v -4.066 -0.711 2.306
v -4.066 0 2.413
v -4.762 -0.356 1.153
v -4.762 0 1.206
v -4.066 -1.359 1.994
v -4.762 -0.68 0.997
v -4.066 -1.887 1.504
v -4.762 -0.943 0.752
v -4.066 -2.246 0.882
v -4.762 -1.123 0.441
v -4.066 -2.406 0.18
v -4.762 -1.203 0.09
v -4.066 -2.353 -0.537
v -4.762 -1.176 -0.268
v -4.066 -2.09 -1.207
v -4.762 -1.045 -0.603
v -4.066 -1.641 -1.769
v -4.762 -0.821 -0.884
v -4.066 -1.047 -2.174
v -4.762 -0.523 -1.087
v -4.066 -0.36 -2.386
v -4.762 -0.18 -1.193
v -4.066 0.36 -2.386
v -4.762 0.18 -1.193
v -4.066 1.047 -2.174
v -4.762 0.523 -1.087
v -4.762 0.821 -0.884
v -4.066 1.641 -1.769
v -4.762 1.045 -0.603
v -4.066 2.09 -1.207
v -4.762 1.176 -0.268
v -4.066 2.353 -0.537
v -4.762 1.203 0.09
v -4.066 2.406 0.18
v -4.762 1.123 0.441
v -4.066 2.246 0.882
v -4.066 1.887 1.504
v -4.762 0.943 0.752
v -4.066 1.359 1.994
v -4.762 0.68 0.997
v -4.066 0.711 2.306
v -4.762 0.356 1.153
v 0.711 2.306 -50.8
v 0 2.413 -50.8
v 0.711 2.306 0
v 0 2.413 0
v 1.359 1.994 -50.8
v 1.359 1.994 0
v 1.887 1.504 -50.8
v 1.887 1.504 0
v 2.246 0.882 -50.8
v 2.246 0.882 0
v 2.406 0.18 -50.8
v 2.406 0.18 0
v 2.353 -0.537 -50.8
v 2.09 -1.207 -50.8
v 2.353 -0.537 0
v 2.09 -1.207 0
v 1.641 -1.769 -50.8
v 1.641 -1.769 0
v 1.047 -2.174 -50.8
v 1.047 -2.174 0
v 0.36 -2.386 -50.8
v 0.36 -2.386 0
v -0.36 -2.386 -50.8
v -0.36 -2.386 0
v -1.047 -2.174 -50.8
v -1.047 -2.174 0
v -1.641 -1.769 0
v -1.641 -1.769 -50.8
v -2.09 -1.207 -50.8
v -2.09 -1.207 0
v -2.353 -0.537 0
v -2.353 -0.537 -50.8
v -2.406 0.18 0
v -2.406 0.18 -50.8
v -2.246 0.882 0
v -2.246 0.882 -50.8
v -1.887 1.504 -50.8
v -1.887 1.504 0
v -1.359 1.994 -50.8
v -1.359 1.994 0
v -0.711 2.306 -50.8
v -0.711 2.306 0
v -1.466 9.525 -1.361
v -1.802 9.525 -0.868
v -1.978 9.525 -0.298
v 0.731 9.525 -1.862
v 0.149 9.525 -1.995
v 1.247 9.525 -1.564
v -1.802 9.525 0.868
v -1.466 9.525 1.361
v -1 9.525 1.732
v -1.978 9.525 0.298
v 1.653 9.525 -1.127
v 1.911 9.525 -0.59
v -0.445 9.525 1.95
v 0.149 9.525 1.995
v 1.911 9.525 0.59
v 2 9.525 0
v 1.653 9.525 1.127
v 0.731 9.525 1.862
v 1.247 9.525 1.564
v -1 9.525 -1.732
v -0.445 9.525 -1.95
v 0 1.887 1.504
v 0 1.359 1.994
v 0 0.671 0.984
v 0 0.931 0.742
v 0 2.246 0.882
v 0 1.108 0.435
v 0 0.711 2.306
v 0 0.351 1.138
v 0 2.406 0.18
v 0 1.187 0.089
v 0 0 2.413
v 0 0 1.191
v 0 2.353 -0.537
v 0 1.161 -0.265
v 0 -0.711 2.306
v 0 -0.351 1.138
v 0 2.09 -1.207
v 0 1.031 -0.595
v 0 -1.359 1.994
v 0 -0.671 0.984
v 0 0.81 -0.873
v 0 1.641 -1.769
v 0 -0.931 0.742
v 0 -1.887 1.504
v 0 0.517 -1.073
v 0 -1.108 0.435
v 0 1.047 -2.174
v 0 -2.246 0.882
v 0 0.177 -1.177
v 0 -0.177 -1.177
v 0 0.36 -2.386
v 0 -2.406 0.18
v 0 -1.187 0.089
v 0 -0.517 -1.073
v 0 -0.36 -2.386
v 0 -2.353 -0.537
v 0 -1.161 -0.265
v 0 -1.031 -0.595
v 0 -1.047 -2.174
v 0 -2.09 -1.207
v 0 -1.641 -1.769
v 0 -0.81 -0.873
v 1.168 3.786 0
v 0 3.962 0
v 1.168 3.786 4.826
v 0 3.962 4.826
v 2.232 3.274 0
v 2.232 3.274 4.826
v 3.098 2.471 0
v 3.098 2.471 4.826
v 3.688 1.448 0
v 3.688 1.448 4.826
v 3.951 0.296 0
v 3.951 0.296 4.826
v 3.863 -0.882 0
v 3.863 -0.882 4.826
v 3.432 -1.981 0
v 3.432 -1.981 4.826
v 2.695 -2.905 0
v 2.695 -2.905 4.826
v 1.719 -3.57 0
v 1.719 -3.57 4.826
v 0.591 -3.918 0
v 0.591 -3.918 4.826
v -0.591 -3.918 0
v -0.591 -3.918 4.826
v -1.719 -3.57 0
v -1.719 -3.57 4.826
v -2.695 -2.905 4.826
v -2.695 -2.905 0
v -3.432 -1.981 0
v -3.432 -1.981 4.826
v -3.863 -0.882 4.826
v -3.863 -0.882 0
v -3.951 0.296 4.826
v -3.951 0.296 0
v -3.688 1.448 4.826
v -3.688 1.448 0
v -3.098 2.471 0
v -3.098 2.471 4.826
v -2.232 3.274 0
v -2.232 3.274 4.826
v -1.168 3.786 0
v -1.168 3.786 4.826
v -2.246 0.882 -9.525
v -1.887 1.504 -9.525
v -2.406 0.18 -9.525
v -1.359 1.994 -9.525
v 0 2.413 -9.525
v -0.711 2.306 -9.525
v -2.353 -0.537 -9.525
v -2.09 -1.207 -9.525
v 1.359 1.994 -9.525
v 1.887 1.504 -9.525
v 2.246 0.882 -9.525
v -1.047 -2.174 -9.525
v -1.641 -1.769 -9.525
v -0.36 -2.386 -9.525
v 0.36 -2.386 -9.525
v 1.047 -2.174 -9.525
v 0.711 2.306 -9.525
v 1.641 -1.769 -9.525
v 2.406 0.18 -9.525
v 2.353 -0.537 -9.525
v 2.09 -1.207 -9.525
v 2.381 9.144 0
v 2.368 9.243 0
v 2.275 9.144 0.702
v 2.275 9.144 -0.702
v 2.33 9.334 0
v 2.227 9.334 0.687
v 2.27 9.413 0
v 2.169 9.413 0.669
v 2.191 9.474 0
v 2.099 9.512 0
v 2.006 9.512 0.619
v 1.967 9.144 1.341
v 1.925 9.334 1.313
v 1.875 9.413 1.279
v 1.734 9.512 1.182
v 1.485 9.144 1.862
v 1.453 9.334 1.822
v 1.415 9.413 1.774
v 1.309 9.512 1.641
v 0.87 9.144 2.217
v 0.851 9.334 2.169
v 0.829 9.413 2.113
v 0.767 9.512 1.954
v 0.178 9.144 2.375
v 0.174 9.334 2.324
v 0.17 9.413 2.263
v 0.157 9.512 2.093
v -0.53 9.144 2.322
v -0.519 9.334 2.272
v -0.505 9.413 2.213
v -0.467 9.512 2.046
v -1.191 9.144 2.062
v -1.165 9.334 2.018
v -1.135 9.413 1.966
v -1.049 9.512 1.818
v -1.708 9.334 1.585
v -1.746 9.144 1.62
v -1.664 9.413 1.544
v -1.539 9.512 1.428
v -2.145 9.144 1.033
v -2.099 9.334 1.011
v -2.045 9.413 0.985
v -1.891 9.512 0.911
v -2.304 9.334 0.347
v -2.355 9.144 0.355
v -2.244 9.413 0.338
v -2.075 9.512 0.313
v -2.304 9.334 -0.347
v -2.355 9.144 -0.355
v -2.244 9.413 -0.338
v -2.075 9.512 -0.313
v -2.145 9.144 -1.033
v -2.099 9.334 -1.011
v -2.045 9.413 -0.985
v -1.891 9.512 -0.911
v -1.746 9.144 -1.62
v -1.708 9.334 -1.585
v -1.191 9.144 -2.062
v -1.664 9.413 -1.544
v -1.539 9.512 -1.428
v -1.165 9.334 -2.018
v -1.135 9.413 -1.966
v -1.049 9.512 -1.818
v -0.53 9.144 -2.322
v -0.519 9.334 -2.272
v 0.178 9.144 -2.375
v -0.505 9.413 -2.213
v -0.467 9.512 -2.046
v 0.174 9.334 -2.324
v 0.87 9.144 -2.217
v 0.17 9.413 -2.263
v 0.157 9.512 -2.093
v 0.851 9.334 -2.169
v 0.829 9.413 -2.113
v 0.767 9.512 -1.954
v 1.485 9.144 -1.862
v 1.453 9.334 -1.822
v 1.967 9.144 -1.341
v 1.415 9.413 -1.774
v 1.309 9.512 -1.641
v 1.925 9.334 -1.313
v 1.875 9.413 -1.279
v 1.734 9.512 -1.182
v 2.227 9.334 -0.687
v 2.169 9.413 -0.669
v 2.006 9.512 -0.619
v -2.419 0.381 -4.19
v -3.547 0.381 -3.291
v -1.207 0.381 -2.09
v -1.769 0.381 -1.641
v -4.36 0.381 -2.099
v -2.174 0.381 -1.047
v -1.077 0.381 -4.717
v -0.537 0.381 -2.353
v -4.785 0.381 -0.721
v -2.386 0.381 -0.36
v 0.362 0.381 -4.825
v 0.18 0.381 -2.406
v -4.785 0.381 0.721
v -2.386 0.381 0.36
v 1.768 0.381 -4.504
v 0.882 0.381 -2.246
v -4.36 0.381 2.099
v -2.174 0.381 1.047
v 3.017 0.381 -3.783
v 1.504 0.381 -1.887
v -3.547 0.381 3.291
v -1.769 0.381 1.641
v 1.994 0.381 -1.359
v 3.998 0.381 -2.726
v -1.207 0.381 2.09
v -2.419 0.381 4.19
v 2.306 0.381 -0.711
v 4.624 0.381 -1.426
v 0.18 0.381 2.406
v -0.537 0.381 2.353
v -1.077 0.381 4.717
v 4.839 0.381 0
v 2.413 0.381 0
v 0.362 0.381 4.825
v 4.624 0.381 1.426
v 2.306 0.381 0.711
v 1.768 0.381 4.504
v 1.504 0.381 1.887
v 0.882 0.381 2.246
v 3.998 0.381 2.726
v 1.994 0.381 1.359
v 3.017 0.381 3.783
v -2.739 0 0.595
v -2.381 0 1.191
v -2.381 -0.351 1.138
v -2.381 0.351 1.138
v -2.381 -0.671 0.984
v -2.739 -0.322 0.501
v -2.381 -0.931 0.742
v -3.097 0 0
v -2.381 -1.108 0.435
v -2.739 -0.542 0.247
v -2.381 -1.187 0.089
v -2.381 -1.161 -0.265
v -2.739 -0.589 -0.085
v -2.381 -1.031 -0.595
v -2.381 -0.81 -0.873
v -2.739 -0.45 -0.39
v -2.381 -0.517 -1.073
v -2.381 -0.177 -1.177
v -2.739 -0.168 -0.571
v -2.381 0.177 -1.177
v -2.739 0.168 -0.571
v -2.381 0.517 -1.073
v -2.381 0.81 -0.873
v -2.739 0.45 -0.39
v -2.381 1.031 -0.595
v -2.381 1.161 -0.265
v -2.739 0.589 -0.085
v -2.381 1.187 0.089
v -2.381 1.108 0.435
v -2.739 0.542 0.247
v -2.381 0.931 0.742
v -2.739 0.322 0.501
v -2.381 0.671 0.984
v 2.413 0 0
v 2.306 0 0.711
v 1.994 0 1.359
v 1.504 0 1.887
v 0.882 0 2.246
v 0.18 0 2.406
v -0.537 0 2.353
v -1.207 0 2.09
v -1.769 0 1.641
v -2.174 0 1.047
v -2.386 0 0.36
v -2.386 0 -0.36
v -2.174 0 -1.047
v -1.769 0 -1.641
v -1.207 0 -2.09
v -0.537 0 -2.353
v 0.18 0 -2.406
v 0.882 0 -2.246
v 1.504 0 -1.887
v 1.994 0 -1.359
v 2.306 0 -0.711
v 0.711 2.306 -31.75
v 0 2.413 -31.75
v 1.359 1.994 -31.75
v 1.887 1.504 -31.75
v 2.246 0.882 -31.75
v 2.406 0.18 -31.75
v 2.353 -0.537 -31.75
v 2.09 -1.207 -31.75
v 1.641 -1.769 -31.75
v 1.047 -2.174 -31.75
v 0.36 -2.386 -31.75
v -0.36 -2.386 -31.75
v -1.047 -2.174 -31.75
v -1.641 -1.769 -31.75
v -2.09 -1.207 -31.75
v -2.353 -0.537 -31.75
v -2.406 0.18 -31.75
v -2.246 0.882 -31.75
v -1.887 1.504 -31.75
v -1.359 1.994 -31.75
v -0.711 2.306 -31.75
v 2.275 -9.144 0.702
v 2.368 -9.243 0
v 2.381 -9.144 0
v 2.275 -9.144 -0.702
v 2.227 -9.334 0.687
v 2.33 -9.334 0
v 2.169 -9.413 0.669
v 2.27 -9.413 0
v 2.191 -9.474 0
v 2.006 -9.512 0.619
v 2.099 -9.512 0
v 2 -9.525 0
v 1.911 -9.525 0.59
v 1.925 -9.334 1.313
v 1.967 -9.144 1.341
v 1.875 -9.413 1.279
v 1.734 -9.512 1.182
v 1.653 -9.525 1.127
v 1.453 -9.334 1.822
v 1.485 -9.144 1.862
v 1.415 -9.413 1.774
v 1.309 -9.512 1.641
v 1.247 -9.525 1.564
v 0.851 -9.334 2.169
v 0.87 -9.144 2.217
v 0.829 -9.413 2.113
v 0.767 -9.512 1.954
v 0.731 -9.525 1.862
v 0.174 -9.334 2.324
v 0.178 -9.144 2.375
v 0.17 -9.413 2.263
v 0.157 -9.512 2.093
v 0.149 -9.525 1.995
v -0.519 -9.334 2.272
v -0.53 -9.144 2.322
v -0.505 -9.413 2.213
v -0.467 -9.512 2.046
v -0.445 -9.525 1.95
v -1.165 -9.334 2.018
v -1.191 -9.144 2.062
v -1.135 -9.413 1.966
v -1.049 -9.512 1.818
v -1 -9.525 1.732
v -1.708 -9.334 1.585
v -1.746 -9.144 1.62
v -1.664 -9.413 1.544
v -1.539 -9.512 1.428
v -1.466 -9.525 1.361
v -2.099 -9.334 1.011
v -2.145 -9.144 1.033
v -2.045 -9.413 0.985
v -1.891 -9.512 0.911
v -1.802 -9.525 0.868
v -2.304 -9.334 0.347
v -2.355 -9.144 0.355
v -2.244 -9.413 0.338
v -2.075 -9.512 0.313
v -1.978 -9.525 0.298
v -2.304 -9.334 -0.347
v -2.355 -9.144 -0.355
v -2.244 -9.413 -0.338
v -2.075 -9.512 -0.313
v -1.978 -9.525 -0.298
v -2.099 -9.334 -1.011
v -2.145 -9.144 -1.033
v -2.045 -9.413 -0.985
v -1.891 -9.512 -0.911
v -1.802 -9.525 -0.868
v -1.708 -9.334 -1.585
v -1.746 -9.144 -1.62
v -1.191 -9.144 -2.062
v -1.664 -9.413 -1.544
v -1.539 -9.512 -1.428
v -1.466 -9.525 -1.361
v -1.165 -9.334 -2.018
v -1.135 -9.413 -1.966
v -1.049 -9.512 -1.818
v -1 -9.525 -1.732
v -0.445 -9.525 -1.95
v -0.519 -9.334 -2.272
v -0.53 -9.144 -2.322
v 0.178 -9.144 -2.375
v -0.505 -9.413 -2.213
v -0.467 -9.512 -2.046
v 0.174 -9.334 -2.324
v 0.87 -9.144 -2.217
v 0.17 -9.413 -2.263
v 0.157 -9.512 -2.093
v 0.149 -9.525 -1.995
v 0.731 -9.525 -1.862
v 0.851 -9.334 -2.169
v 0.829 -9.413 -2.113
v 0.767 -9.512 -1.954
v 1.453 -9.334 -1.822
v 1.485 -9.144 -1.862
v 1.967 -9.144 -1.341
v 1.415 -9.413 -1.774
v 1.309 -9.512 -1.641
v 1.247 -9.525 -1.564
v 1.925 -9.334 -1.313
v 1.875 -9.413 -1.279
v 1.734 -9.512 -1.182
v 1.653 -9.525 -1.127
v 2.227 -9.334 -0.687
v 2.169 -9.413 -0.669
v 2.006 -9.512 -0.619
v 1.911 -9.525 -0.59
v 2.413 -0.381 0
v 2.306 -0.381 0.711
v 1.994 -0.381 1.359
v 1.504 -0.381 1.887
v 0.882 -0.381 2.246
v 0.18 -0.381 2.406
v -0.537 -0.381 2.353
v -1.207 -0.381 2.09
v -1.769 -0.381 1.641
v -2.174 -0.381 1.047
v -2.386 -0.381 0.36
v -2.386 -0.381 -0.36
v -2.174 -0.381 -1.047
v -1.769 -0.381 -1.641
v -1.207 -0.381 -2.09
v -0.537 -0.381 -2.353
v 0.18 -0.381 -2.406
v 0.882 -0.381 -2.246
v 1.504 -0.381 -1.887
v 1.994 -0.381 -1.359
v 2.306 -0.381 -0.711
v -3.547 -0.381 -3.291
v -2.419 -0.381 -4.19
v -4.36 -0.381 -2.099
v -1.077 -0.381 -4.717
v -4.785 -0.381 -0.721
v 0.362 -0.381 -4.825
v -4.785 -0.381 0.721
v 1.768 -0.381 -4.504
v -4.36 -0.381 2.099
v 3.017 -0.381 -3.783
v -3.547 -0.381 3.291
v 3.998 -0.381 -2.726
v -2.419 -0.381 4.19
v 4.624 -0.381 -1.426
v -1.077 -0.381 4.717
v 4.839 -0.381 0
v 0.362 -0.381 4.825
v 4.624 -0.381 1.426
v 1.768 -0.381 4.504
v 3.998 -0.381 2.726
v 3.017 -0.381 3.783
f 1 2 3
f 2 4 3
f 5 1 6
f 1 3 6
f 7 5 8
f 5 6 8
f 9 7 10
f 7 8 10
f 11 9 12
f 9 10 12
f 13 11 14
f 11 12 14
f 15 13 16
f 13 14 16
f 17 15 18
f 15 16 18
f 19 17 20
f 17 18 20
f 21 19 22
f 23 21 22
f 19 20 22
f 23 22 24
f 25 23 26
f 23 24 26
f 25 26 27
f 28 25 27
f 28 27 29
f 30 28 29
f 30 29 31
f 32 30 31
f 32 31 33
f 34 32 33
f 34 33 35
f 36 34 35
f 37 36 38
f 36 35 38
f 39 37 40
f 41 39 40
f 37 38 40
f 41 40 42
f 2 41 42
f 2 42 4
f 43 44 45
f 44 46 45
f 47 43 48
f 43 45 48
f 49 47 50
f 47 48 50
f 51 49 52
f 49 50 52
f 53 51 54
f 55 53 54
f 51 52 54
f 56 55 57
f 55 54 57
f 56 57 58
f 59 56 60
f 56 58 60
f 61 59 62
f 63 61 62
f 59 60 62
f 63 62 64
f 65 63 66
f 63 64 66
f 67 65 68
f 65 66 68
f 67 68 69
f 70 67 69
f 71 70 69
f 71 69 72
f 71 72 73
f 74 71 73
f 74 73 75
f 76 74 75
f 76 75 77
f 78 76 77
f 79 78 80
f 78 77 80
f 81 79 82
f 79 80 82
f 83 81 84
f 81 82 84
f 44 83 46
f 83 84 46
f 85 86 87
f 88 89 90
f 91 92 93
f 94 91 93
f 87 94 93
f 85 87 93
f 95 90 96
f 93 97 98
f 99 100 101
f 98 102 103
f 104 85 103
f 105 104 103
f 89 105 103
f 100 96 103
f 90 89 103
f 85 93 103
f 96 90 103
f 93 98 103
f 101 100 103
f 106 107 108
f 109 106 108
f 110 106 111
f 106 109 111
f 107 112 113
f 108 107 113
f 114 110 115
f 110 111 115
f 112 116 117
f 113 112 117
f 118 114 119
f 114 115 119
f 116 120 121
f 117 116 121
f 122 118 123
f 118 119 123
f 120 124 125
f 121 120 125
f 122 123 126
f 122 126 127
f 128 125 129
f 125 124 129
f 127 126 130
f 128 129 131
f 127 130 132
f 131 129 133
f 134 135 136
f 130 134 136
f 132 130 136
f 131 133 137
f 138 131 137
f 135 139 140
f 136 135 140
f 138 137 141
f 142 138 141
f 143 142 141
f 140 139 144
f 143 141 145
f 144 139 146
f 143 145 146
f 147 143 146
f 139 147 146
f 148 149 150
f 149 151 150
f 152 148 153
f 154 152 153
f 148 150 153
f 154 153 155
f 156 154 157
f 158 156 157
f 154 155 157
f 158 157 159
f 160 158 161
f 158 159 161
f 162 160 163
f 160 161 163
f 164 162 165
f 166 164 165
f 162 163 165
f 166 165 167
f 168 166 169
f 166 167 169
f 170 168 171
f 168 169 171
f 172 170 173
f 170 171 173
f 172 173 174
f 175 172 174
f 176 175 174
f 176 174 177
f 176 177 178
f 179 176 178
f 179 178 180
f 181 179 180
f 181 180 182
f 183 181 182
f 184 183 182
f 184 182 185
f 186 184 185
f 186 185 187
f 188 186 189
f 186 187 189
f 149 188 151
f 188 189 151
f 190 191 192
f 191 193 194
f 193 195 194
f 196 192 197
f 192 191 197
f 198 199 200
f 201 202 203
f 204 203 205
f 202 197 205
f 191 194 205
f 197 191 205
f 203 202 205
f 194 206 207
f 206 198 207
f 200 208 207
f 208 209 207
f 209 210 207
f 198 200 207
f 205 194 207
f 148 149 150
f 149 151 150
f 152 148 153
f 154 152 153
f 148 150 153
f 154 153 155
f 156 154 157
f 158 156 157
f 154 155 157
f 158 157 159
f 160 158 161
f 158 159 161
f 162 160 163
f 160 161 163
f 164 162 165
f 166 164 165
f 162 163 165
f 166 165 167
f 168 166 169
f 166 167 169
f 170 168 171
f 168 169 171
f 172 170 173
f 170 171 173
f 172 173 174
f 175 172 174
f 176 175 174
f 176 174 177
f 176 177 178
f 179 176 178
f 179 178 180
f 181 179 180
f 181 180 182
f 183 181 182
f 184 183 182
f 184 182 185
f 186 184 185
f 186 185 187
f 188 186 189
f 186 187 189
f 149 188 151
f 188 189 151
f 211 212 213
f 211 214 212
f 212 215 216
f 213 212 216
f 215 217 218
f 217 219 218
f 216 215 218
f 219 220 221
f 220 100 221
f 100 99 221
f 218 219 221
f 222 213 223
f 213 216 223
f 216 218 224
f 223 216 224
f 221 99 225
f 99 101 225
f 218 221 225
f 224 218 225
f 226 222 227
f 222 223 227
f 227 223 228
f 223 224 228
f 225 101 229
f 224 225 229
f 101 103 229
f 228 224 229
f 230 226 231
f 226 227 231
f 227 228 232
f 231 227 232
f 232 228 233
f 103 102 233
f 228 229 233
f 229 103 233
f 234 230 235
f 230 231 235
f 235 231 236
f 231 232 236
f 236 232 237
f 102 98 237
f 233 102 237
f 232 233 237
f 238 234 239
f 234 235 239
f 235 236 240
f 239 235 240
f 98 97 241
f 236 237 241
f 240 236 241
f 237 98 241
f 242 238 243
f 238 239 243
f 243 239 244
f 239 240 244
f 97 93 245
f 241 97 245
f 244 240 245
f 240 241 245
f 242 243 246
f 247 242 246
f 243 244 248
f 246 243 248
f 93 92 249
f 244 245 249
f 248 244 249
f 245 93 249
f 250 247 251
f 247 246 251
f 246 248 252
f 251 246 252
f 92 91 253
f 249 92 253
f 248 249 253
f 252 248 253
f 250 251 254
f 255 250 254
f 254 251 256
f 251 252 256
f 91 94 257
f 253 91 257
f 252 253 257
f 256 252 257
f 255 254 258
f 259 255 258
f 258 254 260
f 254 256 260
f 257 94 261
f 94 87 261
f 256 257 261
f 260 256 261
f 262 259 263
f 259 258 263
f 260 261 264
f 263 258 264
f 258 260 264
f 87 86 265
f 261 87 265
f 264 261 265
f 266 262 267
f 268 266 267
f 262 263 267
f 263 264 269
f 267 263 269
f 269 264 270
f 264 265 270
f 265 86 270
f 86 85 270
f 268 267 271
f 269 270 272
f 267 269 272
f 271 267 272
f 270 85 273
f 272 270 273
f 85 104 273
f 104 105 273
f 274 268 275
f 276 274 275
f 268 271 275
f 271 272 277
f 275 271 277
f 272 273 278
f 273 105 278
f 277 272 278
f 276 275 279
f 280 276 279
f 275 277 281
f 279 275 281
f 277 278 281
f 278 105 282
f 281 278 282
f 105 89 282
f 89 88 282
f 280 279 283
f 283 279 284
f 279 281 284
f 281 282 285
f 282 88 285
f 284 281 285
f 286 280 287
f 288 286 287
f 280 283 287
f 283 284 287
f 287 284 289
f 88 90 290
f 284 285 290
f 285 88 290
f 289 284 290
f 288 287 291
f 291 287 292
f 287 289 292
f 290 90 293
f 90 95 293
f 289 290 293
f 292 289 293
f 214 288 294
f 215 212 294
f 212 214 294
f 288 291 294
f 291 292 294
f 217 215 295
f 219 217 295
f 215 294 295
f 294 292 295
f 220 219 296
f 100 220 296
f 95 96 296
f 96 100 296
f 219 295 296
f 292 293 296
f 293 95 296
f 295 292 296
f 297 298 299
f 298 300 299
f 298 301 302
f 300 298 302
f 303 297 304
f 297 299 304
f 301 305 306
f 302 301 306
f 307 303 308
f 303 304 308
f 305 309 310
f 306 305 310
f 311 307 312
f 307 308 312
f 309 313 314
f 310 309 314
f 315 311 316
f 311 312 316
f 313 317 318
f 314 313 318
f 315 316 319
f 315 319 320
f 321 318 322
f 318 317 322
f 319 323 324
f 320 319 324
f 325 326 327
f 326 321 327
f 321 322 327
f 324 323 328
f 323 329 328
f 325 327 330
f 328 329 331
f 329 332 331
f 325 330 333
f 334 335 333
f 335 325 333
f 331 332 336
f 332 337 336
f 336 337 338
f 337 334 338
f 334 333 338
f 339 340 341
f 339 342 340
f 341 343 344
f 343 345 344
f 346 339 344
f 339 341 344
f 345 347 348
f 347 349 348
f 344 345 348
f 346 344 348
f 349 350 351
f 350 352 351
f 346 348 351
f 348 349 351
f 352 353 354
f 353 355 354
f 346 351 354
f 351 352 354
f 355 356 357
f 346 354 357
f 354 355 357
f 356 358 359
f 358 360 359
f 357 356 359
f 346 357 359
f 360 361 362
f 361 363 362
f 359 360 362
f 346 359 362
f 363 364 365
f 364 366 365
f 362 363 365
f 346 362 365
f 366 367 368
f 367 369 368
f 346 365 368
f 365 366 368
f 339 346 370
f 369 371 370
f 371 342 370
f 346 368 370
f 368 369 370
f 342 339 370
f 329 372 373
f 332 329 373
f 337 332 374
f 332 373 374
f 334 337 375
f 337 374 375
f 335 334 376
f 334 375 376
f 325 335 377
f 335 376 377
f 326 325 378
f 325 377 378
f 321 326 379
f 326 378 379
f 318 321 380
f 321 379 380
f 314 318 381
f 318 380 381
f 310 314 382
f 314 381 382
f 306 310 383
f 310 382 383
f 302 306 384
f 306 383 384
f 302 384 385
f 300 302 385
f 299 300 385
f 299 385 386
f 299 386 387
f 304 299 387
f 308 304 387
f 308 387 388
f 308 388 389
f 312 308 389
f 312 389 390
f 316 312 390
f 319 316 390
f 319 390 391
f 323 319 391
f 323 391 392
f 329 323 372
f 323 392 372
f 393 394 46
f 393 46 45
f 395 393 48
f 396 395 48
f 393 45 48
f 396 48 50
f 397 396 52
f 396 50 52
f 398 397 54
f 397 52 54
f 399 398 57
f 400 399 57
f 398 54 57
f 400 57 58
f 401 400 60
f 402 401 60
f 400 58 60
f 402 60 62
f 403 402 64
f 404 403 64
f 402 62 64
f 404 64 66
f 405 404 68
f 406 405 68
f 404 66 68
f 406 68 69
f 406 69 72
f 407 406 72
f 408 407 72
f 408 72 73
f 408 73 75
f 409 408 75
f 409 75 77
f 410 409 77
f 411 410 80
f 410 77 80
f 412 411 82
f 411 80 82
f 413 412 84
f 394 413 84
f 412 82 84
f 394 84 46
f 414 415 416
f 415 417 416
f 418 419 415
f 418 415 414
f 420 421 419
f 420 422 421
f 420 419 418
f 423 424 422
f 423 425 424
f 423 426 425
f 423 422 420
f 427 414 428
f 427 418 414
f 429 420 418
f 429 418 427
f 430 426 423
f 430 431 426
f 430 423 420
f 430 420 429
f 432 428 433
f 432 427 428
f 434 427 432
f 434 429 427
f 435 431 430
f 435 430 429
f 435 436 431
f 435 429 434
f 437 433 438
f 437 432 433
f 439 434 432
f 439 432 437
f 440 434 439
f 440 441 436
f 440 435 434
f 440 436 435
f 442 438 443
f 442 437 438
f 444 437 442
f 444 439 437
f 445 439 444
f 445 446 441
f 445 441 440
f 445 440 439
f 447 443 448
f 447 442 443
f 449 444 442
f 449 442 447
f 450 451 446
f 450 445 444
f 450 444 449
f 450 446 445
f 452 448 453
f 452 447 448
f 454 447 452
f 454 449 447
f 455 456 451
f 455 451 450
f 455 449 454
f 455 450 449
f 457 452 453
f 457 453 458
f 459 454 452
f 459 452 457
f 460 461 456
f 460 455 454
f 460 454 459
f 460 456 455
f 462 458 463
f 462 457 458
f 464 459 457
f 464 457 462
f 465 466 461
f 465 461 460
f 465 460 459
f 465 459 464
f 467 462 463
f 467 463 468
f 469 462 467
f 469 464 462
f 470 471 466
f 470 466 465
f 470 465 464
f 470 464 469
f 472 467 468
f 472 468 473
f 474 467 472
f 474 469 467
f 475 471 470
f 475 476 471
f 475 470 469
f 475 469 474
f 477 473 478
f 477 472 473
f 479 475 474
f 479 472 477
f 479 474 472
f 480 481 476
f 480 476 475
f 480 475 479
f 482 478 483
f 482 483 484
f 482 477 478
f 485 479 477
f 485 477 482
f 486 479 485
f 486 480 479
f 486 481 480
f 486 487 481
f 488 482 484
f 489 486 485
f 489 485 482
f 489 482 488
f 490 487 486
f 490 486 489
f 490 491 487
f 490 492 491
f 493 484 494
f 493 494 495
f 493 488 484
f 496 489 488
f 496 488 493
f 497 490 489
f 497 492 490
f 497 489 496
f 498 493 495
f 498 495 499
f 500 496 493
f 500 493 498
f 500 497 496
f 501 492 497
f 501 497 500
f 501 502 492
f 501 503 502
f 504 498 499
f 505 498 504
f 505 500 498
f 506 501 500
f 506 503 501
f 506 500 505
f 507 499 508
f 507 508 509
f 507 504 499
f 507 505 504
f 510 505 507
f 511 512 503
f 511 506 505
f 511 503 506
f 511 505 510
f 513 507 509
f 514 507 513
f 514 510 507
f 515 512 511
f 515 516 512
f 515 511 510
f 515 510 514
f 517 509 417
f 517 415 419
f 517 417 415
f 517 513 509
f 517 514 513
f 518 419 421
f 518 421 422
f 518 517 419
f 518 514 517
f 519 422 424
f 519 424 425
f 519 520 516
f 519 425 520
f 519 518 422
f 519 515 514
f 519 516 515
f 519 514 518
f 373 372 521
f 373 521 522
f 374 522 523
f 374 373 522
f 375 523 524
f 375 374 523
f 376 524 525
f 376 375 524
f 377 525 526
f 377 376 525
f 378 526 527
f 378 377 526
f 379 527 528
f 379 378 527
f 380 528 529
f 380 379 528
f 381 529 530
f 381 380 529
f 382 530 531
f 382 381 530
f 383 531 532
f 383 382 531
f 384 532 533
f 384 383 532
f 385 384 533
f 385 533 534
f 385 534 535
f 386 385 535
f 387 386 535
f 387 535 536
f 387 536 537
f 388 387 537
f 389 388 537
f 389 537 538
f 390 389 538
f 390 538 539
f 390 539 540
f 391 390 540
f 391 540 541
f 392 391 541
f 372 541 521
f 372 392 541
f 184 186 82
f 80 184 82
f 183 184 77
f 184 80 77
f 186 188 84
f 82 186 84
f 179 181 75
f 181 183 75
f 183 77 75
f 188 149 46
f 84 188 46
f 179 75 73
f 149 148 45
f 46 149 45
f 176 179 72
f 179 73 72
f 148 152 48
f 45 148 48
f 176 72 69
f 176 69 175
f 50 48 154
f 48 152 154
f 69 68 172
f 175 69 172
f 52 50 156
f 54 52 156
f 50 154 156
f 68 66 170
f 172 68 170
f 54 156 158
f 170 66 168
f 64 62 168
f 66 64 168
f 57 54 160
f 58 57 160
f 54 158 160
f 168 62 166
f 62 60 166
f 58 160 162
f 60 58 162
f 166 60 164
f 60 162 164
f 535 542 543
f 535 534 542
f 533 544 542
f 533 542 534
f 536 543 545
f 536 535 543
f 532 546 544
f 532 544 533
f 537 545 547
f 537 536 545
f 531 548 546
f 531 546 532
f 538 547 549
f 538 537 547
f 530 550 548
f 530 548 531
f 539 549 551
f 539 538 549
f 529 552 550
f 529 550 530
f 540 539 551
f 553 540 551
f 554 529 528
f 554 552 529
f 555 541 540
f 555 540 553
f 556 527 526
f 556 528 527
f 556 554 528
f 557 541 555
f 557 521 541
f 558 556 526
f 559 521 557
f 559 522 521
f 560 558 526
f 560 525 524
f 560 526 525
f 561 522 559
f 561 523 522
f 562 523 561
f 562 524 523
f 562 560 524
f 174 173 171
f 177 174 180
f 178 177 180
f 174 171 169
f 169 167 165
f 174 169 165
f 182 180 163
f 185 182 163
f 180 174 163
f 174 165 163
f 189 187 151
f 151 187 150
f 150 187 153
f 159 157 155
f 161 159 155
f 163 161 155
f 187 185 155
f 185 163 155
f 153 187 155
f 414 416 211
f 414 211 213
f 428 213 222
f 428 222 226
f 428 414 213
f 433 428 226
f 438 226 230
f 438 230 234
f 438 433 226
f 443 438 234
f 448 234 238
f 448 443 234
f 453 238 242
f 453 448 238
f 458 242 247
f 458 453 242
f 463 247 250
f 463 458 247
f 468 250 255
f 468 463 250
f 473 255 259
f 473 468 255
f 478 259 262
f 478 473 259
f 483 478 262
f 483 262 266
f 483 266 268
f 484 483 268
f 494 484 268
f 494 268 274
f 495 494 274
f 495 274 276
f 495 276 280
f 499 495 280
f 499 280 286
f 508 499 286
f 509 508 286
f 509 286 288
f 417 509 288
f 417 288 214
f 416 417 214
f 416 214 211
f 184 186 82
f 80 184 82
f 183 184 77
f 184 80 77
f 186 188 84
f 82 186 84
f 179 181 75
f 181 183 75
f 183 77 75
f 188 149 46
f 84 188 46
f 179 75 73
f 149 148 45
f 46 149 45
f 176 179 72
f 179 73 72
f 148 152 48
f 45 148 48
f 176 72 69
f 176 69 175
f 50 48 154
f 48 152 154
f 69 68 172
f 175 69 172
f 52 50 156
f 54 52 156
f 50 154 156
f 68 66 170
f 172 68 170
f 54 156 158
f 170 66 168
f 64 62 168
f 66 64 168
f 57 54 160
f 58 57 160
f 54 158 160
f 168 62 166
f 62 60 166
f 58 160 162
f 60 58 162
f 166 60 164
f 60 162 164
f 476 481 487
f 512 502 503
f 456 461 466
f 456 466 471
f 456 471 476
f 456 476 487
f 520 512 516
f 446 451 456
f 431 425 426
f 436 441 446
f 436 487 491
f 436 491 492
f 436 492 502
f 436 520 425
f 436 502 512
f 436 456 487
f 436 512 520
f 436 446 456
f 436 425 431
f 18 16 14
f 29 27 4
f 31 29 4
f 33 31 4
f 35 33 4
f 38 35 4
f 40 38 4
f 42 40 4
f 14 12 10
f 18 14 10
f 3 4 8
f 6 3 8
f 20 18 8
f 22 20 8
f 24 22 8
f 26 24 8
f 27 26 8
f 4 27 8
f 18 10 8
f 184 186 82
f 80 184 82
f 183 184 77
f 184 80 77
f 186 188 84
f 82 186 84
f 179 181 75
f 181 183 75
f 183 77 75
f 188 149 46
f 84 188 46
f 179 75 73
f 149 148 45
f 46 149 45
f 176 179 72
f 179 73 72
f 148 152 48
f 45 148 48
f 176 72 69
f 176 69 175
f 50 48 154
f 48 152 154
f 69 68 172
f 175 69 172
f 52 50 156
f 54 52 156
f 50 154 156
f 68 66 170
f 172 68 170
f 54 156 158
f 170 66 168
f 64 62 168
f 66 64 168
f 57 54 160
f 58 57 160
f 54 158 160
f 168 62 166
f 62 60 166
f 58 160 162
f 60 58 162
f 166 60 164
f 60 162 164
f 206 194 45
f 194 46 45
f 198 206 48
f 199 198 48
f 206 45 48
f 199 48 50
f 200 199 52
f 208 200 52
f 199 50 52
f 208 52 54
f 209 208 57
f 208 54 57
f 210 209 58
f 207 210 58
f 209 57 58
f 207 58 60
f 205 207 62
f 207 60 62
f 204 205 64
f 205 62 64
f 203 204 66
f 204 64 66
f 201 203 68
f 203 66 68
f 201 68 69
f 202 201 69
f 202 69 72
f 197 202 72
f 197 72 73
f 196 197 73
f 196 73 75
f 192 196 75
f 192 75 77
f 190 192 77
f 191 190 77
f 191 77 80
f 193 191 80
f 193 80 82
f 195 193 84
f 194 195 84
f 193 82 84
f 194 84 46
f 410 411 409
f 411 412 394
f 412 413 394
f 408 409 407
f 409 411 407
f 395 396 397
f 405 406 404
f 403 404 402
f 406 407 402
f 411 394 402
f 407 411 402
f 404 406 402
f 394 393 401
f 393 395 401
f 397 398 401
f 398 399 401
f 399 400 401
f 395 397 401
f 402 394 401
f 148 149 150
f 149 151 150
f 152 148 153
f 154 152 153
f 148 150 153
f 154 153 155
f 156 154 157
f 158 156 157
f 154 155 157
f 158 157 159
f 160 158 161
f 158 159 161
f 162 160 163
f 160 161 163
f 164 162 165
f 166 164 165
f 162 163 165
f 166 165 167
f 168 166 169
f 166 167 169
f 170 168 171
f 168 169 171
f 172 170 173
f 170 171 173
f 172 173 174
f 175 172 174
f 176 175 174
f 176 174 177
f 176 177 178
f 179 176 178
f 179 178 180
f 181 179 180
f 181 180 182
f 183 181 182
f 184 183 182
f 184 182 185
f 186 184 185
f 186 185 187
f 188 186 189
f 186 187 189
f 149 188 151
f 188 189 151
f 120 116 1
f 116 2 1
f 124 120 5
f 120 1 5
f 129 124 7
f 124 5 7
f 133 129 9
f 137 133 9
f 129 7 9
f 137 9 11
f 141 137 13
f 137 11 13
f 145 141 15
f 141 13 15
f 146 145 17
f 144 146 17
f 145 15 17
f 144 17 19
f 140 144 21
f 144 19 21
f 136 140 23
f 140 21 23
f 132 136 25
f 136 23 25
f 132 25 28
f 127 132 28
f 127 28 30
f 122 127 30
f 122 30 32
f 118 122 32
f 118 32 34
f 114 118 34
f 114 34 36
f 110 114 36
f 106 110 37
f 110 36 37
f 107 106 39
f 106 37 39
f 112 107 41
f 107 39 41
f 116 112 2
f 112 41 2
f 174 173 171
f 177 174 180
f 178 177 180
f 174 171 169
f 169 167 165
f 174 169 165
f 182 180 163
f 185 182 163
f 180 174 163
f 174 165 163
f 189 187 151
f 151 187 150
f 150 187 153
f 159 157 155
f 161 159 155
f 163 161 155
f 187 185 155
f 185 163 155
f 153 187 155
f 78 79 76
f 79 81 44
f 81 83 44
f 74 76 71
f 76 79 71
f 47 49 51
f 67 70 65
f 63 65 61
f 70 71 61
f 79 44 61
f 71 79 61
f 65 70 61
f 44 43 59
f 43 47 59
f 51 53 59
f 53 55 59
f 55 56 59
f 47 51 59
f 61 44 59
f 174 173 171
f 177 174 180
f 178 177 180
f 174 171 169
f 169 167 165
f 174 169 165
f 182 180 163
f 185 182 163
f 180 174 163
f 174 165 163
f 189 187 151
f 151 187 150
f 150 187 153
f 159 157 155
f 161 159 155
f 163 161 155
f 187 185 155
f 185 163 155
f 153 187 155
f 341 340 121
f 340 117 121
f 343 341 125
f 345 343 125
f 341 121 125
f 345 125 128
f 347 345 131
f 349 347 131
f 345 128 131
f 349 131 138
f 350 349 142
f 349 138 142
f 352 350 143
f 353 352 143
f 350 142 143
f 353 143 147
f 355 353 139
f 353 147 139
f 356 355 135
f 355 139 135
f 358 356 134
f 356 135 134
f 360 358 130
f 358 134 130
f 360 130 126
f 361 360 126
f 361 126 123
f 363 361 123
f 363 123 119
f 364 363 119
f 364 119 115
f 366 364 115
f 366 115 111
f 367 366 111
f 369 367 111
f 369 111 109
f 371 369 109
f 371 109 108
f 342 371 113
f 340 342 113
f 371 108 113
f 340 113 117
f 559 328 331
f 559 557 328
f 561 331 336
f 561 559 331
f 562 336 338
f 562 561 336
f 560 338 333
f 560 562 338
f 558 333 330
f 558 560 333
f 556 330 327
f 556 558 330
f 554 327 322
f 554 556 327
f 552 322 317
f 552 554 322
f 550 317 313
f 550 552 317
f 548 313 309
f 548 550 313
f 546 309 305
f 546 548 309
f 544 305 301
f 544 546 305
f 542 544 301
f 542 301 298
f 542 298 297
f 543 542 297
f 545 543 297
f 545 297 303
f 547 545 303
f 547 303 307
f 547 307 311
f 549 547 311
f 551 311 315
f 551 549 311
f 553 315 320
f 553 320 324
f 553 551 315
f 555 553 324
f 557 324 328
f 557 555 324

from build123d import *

# Parameters (mm, degrees)
F0_R          = 4.8387
F0_R_2        = 2.413
F1_DEPTH      = 0.381
F1_DEPTH_BACK = 0.381
F2_R          = 2.38125
F3_DEPTH      = 9.525
F3_DEPTH_BACK = 9.525
F4_R          = 0.381


with BuildPart() as f1:
    # F0 (on Front) → F1 (new body, two sides)
    with BuildSketch(Plane.XZ) as f1_sk:
        Circle(F0_R)
        Circle(F0_R_2, mode=Mode.SUBTRACT)
    extrude(amount=F1_DEPTH)
    extrude(f1_sk.sketch, amount=-F1_DEPTH_BACK)


with BuildPart() as f3:
    # F2 (on Front) → F3 (new body, two sides)
    with BuildSketch(Plane.XZ) as f3_sk:
        Circle(F2_R)
    extrude(amount=F3_DEPTH)
    extrude(f3_sk.sketch, amount=-F3_DEPTH_BACK)

    # F4
    f4_edges = [f3.edges().sort_by_distance(p)[0] for p in [
        (-2.38125, -9.525, 0),
        (-2.38125, 9.525, 0),
    ]]
    fillet(f4_edges, radius=F4_R)


with BuildPart() as f6:
    # F5 (on Front) → F6 (revolve)
    with BuildSketch(Plane.XZ):
        Polygon((-4.7625, 0), (-3.09665, 0), (-2.38125, 1.190625), (0, 1.190625), (0, 2.413), (-4.065927, 2.413), (-4.7625, 1.2065), align=None)
    revolve(axis=Axis((4.242493, 0, 0), (1, 0, 0)))


with BuildPart() as f8:
    # F7 (on Right) → F8 (revolve)
    with BuildSketch(Plane.YZ):
        Polygon((3.9624, 4.826), (0, 4.826), (0, -9.525), (2.413, -9.525), (2.413, 0), (3.9624, 0), align=None)
    revolve(axis=Axis((0, 0, -2.876519), (0, 0, -1)))


with BuildPart() as f10:
    # F9 (on Right) → F10 (revolve)
    with BuildSketch(Plane.YZ):
        Polygon((3.9624, 4.826), (0, 4.826), (0, -31.75), (2.413, -31.75), (2.413, 0), (3.9624, 0), align=None)
    revolve(axis=Axis((0, 0, -2.336647), (0, 0, -1)))


with BuildPart() as f12:
    # F11 (on Right) → F12 (revolve)
    with BuildSketch(Plane.YZ):
        Polygon((3.9624, 4.826), (0, 4.826), (0, -50.8), (2.413, -50.8), (2.413, 0), (3.9624, 0), align=None)
    revolve(axis=Axis((0, 0, -13.152602), (0, 0, -1)))


solid = Compound([f1.part, f3.part, f6.part, f8.part, f10.part, f12.part])
